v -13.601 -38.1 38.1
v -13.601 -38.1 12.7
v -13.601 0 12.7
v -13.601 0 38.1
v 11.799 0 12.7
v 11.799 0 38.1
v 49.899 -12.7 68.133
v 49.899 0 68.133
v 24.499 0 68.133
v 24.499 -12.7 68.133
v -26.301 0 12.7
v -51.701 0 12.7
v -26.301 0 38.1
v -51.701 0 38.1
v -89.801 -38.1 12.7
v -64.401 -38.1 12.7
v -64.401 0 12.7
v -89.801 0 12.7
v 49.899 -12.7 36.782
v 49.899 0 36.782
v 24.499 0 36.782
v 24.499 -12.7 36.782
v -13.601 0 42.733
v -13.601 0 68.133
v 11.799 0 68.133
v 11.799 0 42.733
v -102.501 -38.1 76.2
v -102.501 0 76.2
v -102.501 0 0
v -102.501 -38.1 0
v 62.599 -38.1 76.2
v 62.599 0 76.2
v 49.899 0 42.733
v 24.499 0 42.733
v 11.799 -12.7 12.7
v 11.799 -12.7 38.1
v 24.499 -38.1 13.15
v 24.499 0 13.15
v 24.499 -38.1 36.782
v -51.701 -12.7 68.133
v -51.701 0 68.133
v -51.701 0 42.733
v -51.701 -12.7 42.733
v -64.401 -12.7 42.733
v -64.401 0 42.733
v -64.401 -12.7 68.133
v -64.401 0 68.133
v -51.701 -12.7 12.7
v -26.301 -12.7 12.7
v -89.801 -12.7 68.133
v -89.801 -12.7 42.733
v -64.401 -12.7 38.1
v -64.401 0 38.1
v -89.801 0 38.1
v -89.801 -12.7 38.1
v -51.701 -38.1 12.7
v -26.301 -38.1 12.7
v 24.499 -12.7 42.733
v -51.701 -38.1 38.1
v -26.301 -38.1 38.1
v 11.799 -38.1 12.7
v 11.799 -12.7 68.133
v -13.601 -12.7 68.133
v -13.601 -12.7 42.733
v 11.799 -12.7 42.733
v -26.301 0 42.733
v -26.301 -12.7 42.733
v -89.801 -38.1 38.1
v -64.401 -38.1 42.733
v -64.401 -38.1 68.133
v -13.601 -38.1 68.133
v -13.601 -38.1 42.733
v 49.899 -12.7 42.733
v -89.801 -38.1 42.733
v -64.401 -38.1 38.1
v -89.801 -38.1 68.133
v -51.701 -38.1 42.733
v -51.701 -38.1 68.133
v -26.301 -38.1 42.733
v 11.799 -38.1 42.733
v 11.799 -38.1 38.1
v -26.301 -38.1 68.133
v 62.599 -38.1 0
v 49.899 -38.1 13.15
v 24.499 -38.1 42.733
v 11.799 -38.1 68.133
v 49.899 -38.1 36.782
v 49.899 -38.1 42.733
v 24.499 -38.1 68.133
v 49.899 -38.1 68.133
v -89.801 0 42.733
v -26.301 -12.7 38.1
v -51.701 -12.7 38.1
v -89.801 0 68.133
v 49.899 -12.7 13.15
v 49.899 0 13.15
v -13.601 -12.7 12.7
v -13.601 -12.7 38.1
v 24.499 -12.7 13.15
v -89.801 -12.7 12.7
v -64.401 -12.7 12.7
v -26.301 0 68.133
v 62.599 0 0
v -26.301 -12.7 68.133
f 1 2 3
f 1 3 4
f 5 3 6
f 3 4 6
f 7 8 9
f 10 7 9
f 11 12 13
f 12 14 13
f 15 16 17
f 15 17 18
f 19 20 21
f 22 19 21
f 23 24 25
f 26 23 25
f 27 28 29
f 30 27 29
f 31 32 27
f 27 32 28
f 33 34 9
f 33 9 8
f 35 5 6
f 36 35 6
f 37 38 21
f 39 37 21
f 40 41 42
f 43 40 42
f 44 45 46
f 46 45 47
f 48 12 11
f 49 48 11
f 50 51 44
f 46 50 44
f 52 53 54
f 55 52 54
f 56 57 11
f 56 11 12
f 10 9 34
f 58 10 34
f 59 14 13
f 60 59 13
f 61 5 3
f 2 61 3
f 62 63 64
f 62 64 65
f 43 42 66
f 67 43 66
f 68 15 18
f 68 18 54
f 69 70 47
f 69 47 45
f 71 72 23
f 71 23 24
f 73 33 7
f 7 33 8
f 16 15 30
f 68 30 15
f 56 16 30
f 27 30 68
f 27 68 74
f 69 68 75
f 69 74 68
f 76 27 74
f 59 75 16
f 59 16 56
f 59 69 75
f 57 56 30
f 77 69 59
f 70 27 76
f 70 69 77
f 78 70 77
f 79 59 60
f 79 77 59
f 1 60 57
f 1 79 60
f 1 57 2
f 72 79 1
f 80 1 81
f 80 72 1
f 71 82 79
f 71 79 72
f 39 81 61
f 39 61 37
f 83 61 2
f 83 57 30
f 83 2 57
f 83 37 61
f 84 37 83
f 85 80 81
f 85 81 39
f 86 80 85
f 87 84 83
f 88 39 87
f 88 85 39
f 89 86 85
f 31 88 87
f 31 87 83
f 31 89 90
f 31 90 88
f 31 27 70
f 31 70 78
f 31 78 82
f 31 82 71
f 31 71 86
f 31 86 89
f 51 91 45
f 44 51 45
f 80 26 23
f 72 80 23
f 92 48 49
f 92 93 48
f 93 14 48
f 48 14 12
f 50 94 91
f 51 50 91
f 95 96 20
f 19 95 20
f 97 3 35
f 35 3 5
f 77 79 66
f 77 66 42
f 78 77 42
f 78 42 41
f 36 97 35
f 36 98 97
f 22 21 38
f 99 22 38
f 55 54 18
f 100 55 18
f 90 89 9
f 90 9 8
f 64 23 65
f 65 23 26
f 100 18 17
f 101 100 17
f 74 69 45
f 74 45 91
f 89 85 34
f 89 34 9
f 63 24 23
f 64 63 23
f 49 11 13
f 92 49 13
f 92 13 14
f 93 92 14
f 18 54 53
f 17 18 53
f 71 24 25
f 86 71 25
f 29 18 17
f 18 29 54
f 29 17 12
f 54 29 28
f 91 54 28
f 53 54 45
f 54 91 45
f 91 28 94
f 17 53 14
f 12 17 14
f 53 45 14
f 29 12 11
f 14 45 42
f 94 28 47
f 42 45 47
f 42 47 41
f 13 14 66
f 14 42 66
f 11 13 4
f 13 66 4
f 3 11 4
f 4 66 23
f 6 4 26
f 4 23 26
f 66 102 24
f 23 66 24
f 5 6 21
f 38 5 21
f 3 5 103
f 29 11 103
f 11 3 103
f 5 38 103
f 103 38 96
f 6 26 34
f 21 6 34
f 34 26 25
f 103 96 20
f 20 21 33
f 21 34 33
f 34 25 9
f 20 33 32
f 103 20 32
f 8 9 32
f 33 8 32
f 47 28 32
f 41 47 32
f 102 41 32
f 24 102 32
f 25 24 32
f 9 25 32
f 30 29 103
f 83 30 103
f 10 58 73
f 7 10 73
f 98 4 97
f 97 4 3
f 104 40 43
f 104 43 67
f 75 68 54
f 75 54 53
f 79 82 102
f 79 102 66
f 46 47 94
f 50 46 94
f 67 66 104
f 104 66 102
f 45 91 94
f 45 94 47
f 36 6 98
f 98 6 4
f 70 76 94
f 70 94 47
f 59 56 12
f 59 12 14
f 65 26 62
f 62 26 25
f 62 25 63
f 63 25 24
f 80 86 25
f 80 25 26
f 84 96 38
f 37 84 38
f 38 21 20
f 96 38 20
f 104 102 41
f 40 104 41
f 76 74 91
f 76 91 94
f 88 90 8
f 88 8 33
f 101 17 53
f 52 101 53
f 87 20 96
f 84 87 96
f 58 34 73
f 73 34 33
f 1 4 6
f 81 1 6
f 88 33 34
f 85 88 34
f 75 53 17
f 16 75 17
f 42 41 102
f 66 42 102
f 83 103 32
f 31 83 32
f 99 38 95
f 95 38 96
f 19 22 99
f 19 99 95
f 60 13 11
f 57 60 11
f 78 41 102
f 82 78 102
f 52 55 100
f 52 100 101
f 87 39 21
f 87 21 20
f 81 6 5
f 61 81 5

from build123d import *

# Parameters (mm, degrees)
F1_DEPTH = 38.1
F0_W     = 12.7
F0_H     = 12.7
F2_DEPTH = 12.7


with BuildPart() as f1:
    # F0 (on Front) → F1 (new body)
    with BuildSketch(Plane.XZ):
        Polygon((37.198733, 68.132558), (37.198733, 76.2), (-102.501267, 76.2), (-102.501267, 25.4), (-89.801267, 25.4), (-89.801267, 38.1), (-64.401267, 38.1), (-64.401267, 25.4), (-64.401267, 12.7), (-77.101267, 12.7), (-77.101267, 0), (62.598733, 0), (62.598733, 55.432558), (49.898733, 55.432558), (49.898733, 42.732558), (24.498733, 42.732558), (24.498733, 55.432558), (24.498733, 68.132558), align=None)
        Polygon((-51.701267, 12.7), (-51.701267, 25.4), (-51.701267, 38.1), (-26.301267, 38.1), (-26.301267, 25.4), (-26.301267, 12.7), align=None, mode=Mode.SUBTRACT)
        Polygon((-13.601267, 12.7), (-13.601267, 25.4), (-13.601267, 38.1), (11.798733, 38.1), (11.798733, 25.4), (11.798733, 12.7), align=None, mode=Mode.SUBTRACT)
        Polygon((24.498733, 13.150497), (24.498733, 25.4), (24.498733, 36.781578), (49.898733, 36.781578), (49.898733, 13.150497), align=None, mode=Mode.SUBTRACT)
        Polygon((-64.401267, 68.132558), (-64.401267, 55.432558), (-64.401267, 42.732558), (-89.801267, 42.732558), (-89.801267, 68.132558), align=None, mode=Mode.SUBTRACT)
        Polygon((-26.301267, 68.132558), (-26.301267, 55.432558), (-26.301267, 42.732558), (-51.701267, 42.732558), (-51.701267, 55.432558), (-51.701267, 68.132558), align=None, mode=Mode.SUBTRACT)
        Polygon((11.798733, 68.132558), (11.798733, 55.432558), (11.798733, 42.732558), (-13.601267, 42.732558), (-13.601267, 55.432558), (-13.601267, 68.132558), align=None, mode=Mode.SUBTRACT)
        Polygon((-89.801267, 25.4), (-102.501267, 25.4), (-102.501267, 0), (-77.101267, 0), (-77.101267, 12.7), (-89.801267, 12.7), align=None)
        Polygon((62.598733, 55.432558), (62.598733, 76.2), (37.198733, 76.2), (37.198733, 68.132558), (49.898733, 68.132558), (49.898733, 55.432558), align=None)
    extrude(amount=F1_DEPTH)


with BuildPart() as f2:
    # F0 (on Front) → F2 (new body)
    with BuildSketch(Plane.XZ):
        Polygon((-64.401267, 42.732558), (-64.401267, 55.432558), (-64.401267, 68.132558), (-89.801267, 68.132558), (-89.801267, 42.732558), align=None)
        with Locations((-70.751267, 19.05)):
            Rectangle(F0_W, F0_H)
        Polygon((-89.801267, 38.1), (-89.801267, 25.4), (-77.101267, 25.4), (-64.401267, 25.4), (-64.401267, 38.1), align=None)
        with Locations((-83.451267, 19.05)):
            Rectangle(F0_W, F0_H)
        Polygon((-39.001267, 25.4), (-51.701267, 25.4), (-51.701267, 12.7), (-26.301267, 12.7), (-26.301267, 25.4), align=None)
        Polygon((-51.701267, 38.1), (-51.701267, 25.4), (-39.001267, 25.4), (-26.301267, 25.4), (-26.301267, 38.1), align=None)
        Polygon((-26.301267, 42.732558), (-26.301267, 55.432558), (-39.001267, 55.432558), (-51.701267, 55.432558), (-51.701267, 42.732558), align=None)
        Polygon((-39.001267, 55.432558), (-26.301267, 55.432558), (-26.301267, 68.132558), (-51.701267, 68.132558), (-51.701267, 55.432558), align=None)
        Polygon((-0.901267, 25.4), (-13.601267, 25.4), (-13.601267, 12.7), (11.798733, 12.7), (11.798733, 25.4), align=None)
        Polygon((-13.601267, 38.1), (-13.601267, 25.4), (-0.901267, 25.4), (11.798733, 25.4), (11.798733, 38.1), align=None)
        Polygon((-0.901267, 55.432558), (11.798733, 55.432558), (11.798733, 68.132558), (-13.601267, 68.132558), (-13.601267, 55.432558), align=None)
        Polygon((11.798733, 42.732558), (11.798733, 55.432558), (-0.901267, 55.432558), (-13.601267, 55.432558), (-13.601267, 42.732558), align=None)
        Polygon((49.898733, 42.732558), (49.898733, 55.432558), (37.198733, 55.432558), (24.498733, 55.432558), (24.498733, 42.732558), align=None)
        with Locations((30.848733, 61.782558)):
            Rectangle(F0_W, F0_H)
        with Locations((43.548733, 61.782558)):
            Rectangle(F0_W, F0_H)
        Polygon((24.498733, 36.781578), (24.498733, 25.4), (24.498733, 13.150497), (49.898733, 13.150497), (49.898733, 36.781578), align=None)
    extrude(amount=F2_DEPTH)


solid = Compound([f1.part, f2.part])
